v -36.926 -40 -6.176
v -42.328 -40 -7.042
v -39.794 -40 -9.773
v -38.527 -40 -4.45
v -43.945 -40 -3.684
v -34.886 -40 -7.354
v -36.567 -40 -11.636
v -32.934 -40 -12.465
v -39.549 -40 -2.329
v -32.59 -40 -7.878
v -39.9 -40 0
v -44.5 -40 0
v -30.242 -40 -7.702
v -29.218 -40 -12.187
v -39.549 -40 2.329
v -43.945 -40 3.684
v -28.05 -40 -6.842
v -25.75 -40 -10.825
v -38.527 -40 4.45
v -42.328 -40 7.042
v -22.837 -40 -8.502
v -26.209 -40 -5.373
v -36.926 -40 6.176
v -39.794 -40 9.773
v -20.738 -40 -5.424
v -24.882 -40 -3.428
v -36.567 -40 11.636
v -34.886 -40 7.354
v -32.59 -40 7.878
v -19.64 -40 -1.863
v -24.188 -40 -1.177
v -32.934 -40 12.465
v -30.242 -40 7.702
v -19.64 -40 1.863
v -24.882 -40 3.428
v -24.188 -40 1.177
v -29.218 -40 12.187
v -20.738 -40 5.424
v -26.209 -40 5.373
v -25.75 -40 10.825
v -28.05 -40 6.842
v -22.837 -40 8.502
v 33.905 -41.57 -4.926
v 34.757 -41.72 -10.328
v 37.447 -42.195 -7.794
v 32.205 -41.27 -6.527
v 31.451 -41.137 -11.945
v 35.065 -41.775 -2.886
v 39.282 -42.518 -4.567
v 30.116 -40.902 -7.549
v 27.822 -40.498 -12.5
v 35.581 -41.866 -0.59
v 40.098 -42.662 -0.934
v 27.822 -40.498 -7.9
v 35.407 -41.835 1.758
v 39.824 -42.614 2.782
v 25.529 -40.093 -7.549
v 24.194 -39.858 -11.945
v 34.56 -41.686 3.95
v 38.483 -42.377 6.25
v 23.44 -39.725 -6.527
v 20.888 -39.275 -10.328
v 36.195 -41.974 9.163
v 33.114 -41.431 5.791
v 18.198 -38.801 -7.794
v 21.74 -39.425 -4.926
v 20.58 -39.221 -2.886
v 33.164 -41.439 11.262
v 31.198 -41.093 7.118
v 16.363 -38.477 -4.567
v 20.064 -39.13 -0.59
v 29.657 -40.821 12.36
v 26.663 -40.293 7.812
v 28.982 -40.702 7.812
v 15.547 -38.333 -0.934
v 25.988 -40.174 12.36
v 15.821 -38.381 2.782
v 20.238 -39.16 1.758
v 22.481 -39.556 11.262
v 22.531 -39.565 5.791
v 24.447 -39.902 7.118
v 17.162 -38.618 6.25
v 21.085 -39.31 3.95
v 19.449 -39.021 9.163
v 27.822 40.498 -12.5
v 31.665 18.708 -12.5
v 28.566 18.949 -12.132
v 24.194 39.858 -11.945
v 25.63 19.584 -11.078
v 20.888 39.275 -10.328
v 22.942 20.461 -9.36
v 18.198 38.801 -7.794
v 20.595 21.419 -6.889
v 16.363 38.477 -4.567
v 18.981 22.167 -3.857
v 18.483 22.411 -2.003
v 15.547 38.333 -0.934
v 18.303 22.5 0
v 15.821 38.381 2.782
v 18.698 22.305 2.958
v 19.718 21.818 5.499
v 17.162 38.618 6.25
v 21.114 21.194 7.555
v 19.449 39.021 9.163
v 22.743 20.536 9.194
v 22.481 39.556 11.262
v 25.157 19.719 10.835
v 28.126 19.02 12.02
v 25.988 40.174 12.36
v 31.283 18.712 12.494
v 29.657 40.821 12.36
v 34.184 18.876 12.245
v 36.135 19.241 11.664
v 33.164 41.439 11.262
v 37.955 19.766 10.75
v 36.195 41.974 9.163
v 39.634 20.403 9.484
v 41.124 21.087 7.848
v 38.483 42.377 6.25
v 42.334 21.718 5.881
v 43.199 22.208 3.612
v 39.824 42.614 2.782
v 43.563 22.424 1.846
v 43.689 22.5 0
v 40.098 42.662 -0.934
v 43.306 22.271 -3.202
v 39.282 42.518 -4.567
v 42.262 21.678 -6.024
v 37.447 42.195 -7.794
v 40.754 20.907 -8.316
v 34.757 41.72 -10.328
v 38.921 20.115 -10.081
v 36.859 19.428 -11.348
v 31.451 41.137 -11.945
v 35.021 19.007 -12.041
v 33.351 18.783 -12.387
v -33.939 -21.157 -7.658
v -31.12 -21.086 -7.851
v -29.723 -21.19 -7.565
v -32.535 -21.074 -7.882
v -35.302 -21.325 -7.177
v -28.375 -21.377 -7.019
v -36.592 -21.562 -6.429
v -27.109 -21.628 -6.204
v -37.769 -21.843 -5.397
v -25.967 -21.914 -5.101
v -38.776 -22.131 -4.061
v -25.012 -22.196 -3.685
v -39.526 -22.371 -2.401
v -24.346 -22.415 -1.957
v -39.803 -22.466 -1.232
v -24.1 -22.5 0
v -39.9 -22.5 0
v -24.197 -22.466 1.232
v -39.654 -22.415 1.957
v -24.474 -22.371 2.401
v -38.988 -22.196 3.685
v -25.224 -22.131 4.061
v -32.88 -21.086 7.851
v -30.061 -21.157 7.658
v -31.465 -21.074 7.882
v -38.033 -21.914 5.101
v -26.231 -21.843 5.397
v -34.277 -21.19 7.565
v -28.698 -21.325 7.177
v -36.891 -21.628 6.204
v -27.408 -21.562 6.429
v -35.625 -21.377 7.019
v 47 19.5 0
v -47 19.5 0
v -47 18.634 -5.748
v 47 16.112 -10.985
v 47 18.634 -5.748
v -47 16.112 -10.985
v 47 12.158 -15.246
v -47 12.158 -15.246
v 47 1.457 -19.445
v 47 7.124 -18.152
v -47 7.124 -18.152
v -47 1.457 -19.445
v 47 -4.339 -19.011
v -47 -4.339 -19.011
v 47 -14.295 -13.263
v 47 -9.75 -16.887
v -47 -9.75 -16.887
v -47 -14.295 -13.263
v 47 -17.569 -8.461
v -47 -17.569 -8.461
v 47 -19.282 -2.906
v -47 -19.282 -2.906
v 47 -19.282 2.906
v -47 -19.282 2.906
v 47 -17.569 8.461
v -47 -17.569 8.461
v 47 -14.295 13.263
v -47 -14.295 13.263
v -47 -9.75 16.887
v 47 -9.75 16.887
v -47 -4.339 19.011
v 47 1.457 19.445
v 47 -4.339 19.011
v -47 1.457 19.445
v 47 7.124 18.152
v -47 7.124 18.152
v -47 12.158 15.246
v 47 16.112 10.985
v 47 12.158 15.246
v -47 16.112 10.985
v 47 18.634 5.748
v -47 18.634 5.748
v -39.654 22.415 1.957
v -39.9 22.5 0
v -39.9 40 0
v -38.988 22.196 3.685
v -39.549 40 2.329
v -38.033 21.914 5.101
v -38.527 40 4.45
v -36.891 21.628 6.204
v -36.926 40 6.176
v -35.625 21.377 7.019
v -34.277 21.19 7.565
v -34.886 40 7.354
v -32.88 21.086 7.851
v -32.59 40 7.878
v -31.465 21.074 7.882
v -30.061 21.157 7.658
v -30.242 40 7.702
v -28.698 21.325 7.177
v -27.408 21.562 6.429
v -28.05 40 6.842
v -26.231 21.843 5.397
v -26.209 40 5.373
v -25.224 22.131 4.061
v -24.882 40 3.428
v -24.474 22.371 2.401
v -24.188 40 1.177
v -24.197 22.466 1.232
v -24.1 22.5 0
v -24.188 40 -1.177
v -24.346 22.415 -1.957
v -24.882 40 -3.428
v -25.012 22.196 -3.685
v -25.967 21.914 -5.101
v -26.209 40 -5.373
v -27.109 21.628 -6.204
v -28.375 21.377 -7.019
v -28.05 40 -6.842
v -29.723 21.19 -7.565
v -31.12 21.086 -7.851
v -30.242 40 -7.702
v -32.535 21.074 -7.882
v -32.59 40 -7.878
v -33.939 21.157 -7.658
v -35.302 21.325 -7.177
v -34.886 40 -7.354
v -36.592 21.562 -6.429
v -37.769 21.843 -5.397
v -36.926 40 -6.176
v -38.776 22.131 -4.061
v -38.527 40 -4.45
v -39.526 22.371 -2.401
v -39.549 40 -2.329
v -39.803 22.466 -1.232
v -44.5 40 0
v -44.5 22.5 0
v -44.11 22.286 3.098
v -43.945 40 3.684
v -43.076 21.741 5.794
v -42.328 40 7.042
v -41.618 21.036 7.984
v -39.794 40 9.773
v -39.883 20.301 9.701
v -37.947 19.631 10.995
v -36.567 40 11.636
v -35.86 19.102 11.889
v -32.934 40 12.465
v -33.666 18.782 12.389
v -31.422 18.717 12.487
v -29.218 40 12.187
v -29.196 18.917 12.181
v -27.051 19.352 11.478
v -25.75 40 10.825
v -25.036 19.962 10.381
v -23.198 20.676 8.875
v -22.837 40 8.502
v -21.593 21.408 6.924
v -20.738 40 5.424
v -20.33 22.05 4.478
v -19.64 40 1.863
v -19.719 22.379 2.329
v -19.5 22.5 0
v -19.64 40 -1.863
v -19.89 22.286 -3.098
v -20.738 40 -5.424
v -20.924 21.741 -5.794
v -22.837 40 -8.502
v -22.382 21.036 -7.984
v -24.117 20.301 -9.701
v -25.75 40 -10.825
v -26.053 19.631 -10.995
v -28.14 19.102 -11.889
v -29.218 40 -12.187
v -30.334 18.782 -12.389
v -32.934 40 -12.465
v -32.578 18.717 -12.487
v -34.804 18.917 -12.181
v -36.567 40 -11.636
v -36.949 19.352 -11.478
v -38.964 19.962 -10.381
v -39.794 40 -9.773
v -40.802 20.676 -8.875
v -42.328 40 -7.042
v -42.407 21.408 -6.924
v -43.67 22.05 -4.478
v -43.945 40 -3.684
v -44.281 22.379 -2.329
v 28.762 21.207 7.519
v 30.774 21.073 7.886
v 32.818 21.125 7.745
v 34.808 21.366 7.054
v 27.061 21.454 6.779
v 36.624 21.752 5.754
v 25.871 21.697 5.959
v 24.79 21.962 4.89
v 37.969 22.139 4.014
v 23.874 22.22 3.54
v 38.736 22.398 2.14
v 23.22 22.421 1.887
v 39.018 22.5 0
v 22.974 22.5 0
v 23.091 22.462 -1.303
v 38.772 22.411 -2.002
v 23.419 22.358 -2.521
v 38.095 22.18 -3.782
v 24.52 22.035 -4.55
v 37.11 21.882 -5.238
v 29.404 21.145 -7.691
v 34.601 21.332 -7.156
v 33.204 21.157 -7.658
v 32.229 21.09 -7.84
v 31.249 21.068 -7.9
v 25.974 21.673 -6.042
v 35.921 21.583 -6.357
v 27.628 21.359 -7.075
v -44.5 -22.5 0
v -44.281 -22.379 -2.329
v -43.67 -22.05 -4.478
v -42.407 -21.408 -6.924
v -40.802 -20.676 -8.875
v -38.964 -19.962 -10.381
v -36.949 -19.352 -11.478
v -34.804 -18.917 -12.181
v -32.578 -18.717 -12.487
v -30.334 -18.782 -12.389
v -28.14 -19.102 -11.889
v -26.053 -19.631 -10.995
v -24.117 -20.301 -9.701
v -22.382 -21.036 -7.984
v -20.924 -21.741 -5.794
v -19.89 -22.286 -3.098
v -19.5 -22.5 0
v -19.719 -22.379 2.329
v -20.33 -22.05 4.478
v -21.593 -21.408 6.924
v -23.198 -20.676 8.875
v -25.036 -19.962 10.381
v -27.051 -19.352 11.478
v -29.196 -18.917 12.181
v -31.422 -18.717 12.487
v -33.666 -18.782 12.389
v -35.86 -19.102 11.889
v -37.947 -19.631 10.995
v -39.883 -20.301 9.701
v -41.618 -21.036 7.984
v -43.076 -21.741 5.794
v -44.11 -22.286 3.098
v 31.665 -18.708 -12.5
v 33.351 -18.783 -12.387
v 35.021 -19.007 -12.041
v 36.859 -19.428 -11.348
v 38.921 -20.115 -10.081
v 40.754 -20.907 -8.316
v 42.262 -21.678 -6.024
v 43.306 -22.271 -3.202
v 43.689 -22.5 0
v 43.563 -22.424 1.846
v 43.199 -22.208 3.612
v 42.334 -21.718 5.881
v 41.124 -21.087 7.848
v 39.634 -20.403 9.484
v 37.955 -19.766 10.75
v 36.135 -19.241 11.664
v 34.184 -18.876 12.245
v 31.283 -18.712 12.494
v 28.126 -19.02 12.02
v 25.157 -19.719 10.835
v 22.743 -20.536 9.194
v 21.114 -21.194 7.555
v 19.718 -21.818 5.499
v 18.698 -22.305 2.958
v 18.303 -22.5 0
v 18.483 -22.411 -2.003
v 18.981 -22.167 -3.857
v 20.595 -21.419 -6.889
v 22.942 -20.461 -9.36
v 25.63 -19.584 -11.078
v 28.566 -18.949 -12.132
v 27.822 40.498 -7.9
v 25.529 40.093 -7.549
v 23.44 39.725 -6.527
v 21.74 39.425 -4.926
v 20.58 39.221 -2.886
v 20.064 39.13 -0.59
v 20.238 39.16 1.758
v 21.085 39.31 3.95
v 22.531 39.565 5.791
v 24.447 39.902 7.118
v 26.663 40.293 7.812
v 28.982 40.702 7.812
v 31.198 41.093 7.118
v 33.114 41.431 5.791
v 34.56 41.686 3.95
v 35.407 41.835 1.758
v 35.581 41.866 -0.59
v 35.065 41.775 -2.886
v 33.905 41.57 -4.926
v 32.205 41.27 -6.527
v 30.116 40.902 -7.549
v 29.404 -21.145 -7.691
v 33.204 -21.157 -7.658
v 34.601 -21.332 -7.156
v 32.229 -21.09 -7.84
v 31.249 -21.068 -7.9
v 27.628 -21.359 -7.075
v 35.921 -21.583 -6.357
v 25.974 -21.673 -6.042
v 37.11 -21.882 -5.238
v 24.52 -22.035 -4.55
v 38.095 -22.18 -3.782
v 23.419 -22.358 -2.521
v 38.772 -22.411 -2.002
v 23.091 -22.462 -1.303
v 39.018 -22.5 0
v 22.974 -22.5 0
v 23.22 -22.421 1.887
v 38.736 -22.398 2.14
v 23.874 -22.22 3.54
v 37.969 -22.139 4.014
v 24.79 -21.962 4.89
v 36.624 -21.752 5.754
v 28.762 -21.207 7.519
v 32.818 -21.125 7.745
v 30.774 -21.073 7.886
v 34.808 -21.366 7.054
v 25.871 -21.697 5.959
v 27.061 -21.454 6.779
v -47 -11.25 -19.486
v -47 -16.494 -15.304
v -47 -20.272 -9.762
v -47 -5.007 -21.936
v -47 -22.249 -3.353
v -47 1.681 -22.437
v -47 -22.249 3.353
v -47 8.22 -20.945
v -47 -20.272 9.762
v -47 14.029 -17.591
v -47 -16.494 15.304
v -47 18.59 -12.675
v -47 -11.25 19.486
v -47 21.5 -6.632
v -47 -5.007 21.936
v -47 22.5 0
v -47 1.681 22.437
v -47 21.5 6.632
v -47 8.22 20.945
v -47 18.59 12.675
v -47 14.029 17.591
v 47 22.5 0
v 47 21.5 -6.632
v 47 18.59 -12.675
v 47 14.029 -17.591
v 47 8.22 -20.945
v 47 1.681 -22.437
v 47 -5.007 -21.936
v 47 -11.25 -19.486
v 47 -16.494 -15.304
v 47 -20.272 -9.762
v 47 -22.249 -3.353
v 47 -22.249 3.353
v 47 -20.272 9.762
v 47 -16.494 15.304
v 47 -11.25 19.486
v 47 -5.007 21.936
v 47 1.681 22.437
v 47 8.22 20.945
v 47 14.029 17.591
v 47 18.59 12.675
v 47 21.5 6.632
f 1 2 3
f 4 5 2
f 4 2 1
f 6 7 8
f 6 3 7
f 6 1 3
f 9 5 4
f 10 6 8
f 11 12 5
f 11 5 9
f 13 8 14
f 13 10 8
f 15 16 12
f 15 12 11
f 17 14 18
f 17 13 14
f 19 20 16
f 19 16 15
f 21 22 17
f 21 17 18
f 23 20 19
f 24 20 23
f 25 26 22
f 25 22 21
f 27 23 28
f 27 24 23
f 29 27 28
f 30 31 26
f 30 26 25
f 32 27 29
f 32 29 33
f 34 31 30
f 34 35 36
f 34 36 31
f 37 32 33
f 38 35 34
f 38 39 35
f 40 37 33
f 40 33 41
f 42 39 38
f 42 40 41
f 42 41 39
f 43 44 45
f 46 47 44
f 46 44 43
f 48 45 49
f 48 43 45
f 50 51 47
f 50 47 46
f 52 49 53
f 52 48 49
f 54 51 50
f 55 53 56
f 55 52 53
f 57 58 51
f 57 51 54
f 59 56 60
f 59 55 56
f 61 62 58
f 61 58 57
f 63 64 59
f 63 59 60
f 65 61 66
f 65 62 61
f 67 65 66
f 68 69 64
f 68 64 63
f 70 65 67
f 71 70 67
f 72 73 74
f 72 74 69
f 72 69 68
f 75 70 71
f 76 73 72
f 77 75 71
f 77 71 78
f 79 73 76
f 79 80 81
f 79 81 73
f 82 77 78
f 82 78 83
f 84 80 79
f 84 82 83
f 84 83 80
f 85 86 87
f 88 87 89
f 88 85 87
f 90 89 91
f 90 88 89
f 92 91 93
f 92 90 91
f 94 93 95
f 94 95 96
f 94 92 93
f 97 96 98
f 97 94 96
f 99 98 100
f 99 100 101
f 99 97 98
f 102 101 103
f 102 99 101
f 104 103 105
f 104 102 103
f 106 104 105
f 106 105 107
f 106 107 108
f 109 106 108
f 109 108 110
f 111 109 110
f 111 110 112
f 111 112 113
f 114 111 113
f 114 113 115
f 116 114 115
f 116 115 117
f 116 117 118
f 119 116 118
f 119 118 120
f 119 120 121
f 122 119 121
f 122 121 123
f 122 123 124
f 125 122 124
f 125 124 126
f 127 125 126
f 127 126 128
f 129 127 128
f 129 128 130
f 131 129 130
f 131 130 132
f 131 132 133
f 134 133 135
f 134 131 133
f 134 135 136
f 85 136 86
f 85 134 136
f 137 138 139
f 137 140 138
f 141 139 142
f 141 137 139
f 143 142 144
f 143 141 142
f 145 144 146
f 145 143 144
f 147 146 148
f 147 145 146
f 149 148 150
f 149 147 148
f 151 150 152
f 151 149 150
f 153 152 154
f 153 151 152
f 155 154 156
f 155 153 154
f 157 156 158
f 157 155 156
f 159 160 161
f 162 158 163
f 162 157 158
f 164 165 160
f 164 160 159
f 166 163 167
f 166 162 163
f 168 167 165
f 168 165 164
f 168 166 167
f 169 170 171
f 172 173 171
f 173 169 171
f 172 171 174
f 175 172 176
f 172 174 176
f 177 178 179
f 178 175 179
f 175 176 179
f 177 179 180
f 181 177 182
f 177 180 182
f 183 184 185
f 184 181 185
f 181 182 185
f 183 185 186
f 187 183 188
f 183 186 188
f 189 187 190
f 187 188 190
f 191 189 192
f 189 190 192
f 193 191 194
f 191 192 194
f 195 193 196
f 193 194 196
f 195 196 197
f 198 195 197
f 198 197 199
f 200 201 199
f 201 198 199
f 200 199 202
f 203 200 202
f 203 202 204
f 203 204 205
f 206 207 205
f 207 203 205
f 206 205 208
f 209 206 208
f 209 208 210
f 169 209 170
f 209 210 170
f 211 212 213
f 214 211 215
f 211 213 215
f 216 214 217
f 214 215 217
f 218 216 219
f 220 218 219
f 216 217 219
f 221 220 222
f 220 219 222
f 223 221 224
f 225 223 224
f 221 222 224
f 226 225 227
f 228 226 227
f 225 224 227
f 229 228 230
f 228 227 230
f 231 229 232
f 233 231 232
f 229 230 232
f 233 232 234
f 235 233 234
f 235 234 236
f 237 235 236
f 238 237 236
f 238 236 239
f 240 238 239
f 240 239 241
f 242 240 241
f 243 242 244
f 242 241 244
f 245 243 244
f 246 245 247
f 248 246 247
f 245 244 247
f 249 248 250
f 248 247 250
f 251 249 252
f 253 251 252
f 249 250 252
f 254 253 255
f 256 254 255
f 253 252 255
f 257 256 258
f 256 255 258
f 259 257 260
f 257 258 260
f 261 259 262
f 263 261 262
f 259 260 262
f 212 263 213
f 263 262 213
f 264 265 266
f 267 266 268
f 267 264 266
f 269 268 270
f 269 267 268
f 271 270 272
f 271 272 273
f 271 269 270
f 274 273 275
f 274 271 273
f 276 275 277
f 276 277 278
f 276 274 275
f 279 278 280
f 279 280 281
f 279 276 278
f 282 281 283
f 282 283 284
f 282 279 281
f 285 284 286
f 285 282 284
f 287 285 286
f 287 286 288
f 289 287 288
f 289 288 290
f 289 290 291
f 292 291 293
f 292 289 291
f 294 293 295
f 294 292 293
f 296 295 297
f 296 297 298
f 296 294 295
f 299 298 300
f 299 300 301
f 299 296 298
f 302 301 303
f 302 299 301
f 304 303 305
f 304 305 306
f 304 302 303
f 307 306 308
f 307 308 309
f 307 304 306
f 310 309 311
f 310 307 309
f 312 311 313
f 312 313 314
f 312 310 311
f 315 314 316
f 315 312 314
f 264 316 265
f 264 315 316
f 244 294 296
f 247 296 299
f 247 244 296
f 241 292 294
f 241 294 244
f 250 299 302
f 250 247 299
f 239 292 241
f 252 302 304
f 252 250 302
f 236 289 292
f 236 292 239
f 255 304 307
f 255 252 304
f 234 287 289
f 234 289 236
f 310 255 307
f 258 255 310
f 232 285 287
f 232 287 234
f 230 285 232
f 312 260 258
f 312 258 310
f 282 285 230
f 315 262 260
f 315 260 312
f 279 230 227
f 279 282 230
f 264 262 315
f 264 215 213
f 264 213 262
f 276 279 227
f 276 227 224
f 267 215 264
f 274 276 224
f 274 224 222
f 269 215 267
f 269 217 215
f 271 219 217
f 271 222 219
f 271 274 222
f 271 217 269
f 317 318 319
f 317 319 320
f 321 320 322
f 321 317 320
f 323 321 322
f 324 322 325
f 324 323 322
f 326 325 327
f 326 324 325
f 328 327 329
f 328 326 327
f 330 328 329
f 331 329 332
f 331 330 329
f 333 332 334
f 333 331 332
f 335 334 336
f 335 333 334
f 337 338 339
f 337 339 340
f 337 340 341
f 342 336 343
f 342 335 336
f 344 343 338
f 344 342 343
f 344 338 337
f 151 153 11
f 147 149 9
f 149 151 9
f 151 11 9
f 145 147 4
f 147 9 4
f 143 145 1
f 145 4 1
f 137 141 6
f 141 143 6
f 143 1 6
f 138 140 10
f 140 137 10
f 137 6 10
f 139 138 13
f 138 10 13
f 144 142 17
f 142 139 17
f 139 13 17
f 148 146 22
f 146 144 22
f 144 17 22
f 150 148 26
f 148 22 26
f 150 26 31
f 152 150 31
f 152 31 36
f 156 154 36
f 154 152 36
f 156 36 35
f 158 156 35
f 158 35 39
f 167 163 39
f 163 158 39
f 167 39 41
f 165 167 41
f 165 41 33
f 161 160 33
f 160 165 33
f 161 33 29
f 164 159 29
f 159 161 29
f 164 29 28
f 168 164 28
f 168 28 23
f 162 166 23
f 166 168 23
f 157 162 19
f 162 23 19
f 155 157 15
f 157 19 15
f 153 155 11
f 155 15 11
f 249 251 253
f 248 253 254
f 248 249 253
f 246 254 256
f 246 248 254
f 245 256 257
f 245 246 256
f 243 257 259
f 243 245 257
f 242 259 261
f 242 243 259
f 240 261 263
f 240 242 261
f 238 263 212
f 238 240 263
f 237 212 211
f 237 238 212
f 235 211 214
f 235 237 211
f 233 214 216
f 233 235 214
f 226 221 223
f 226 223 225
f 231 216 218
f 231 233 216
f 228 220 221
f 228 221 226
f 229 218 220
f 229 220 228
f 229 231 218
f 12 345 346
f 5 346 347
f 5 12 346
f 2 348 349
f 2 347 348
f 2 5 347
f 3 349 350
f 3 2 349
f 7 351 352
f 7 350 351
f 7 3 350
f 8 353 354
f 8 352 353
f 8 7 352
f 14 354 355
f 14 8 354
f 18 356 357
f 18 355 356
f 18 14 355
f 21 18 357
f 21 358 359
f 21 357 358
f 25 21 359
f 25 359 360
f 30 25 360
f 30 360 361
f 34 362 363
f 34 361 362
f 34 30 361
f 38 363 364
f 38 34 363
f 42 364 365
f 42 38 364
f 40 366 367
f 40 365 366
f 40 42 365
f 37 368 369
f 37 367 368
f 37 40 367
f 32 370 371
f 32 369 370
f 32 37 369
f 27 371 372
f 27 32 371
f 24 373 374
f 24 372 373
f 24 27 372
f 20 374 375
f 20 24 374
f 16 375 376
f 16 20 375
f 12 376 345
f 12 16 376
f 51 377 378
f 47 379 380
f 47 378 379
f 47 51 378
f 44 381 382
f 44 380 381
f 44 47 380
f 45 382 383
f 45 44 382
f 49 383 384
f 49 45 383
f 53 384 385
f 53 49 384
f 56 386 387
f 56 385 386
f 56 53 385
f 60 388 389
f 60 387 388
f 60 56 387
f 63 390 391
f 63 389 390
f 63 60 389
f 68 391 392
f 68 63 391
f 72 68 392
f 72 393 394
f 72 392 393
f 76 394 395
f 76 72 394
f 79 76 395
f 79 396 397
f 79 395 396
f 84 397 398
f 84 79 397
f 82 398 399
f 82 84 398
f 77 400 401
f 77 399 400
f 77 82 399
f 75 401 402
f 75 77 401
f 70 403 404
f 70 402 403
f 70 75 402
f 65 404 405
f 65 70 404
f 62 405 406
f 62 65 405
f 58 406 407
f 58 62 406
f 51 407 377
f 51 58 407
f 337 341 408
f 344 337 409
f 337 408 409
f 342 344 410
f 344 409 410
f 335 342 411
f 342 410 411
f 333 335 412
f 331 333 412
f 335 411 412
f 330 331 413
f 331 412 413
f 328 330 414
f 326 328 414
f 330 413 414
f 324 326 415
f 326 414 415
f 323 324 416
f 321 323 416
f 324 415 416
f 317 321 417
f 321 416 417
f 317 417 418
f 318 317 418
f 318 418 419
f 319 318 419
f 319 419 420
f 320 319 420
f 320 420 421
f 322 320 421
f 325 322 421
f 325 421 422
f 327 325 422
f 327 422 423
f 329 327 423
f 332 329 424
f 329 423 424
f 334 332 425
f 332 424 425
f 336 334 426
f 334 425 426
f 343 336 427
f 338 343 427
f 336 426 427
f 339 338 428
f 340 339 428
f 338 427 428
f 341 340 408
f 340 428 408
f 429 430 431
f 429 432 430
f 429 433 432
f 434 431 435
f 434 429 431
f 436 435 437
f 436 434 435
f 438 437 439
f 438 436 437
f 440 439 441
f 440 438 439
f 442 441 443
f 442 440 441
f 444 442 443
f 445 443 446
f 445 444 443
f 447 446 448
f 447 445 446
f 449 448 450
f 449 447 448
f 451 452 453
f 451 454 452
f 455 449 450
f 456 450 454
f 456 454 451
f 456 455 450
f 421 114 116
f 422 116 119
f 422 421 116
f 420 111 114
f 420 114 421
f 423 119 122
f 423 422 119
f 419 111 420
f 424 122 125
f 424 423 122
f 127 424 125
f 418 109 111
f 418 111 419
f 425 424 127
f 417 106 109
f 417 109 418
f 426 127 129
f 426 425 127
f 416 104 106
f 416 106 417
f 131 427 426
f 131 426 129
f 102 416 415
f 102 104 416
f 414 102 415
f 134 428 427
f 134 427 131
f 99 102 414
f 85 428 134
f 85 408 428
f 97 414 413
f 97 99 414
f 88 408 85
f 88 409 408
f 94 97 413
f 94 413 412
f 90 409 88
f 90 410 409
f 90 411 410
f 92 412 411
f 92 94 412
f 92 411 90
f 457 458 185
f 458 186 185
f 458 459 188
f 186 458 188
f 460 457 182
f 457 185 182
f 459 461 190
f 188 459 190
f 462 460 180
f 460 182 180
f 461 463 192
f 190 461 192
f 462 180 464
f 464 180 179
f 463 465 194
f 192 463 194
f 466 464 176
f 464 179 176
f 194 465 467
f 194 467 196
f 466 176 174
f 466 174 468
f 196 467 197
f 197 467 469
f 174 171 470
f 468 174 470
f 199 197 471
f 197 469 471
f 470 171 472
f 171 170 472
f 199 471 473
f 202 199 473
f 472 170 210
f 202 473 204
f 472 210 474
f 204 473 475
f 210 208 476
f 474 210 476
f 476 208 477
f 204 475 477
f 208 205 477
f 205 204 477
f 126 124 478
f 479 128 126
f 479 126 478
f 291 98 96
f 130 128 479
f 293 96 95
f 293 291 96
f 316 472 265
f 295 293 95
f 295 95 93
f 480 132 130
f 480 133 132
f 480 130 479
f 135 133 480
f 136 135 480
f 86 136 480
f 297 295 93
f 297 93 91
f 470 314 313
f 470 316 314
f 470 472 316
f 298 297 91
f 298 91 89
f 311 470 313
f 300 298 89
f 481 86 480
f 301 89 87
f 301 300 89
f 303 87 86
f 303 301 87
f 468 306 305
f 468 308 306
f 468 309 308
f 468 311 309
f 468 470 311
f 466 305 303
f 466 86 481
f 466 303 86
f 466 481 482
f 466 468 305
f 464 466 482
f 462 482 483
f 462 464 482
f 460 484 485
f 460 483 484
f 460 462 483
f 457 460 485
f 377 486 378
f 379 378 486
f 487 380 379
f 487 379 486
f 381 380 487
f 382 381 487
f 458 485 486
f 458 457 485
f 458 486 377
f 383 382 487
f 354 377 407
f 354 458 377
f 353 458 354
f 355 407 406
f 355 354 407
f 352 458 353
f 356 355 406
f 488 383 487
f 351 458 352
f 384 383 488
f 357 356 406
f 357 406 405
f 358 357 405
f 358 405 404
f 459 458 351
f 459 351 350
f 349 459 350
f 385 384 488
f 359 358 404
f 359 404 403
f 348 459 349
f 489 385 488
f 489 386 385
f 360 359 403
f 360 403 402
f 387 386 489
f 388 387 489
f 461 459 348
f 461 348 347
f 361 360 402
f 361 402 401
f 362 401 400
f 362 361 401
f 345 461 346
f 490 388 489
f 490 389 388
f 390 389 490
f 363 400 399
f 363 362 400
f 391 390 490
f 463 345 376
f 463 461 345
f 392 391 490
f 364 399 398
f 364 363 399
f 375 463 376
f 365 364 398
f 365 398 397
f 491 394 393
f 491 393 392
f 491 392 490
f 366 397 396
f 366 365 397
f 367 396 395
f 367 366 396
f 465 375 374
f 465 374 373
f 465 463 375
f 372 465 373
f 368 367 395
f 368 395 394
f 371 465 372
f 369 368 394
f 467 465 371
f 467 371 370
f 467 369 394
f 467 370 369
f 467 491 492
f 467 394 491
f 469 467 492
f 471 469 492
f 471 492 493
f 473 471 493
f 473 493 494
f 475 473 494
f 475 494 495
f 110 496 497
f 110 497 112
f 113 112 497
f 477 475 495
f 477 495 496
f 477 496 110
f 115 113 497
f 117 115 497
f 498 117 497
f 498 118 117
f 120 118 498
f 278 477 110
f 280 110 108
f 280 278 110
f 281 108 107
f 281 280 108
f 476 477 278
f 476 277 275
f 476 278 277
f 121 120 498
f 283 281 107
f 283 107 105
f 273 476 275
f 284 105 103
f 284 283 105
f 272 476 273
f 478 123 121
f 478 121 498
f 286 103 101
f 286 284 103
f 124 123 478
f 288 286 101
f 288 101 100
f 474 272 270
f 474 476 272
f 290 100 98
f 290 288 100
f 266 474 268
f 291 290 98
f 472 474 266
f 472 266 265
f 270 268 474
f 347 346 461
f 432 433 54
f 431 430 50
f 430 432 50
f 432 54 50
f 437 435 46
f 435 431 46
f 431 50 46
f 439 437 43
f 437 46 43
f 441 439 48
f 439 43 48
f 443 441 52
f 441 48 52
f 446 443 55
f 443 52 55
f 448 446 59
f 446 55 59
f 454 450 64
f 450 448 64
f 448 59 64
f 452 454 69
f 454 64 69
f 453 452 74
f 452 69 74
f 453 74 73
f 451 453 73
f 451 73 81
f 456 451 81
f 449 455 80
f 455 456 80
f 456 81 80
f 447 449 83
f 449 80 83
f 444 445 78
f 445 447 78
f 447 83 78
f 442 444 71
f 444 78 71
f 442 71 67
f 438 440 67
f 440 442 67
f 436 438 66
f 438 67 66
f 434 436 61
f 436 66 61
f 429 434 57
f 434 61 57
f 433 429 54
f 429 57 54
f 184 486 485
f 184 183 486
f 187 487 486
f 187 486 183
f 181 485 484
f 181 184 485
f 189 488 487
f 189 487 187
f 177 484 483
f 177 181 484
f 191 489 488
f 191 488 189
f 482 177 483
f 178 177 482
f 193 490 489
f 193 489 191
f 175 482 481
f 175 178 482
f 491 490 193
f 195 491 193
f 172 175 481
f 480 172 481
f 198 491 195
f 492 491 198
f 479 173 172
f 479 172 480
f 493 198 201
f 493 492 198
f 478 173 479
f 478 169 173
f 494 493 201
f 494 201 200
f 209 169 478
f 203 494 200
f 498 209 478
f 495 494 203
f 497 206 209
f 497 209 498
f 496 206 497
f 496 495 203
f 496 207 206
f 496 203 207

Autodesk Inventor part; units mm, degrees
ref_plane "YZ Plane" through (0, 0, 0) normal (1, 0, 0) x (0, 1, 0)
sketch "Sketch1" plane through (0, 0, 0) normal (1, 0, 0) x (0, 1, 0)
  circle A0 centre (0, 0) radius 19.5
  circle A1 centre (0, 0) radius 22.5
  dimension "d0" = 39
  dimension "d1" = 45
extrude "Extrusion1" add sketch "Sketch1" along normal mid plane 94
ref_plane "Work Plane1" through (0, 40, 0) normal (0, 1, 0) x (-1, 0, 0)
sketch "Sketch2" plane through (0, 40, 0) normal (0, 1, 0) x (-1, 0, 0)
  circle A0 centre (32, 0) radius 12.5
  circle A1 centre (32, 0) radius 7.9
  line L0 (47, -22.5) -> (47, 22.5) projected
  point P0 (0, 0)
  dimension "d6" = 25
  dimension "d7" = 15.8
  dimension "d19" = 15
extrude "Extrusion2" add sketch "Sketch2" against normal up to surface
sketch "Sketch3" plane through (0, 40, 0) normal (0, 1, 0) x (-1, 0, 0)
  line L0 (47, 22.5) -> (-47, 22.5) projected
  line L1 (-25, 22.5) -> (-25, -21.8926)
  line L2 (47, 22.5) -> (-47, 22.5) projected
  point P0 (0, 0)
  dimension "d16" = 25
ref_plane "Work Plane3" through (25, 40, 22.5) normal (-0.1736, 0.9848, 0) x (0, 0, -1)
sketch "Sketch4" plane through (25, 40, 22.5) normal (-0.1736, 0.9848, 0) x (0, 0, -1)
  ellipse E0 centre (22.5, 56.134) end of major axis (14.6, 56.134) minor radius 7.78 projected
  circle A0 centre (22.5, -2.866) radius 7.9
  circle A1 centre (22.5, -2.866) radius 12.5
  ellipse E1 centre (22.5, 56.134) end of major axis (10, 56.134) minor radius 12.3101 projected
  point P0 (22.5, 31.5661)
  dimension "d11" = 59
  dimension "d12" = 15.8
  dimension "d13" = 25
extrude "Extrusion3" add sketch "Sketch4" against normal up to surface contours A1
mirror "Mirror1" about plane through (0, 0, 0) normal (0, 1, 0) of "Extrusion2", "Extrusion3"
properties part number "JuntaRodilla" material "PLA"
